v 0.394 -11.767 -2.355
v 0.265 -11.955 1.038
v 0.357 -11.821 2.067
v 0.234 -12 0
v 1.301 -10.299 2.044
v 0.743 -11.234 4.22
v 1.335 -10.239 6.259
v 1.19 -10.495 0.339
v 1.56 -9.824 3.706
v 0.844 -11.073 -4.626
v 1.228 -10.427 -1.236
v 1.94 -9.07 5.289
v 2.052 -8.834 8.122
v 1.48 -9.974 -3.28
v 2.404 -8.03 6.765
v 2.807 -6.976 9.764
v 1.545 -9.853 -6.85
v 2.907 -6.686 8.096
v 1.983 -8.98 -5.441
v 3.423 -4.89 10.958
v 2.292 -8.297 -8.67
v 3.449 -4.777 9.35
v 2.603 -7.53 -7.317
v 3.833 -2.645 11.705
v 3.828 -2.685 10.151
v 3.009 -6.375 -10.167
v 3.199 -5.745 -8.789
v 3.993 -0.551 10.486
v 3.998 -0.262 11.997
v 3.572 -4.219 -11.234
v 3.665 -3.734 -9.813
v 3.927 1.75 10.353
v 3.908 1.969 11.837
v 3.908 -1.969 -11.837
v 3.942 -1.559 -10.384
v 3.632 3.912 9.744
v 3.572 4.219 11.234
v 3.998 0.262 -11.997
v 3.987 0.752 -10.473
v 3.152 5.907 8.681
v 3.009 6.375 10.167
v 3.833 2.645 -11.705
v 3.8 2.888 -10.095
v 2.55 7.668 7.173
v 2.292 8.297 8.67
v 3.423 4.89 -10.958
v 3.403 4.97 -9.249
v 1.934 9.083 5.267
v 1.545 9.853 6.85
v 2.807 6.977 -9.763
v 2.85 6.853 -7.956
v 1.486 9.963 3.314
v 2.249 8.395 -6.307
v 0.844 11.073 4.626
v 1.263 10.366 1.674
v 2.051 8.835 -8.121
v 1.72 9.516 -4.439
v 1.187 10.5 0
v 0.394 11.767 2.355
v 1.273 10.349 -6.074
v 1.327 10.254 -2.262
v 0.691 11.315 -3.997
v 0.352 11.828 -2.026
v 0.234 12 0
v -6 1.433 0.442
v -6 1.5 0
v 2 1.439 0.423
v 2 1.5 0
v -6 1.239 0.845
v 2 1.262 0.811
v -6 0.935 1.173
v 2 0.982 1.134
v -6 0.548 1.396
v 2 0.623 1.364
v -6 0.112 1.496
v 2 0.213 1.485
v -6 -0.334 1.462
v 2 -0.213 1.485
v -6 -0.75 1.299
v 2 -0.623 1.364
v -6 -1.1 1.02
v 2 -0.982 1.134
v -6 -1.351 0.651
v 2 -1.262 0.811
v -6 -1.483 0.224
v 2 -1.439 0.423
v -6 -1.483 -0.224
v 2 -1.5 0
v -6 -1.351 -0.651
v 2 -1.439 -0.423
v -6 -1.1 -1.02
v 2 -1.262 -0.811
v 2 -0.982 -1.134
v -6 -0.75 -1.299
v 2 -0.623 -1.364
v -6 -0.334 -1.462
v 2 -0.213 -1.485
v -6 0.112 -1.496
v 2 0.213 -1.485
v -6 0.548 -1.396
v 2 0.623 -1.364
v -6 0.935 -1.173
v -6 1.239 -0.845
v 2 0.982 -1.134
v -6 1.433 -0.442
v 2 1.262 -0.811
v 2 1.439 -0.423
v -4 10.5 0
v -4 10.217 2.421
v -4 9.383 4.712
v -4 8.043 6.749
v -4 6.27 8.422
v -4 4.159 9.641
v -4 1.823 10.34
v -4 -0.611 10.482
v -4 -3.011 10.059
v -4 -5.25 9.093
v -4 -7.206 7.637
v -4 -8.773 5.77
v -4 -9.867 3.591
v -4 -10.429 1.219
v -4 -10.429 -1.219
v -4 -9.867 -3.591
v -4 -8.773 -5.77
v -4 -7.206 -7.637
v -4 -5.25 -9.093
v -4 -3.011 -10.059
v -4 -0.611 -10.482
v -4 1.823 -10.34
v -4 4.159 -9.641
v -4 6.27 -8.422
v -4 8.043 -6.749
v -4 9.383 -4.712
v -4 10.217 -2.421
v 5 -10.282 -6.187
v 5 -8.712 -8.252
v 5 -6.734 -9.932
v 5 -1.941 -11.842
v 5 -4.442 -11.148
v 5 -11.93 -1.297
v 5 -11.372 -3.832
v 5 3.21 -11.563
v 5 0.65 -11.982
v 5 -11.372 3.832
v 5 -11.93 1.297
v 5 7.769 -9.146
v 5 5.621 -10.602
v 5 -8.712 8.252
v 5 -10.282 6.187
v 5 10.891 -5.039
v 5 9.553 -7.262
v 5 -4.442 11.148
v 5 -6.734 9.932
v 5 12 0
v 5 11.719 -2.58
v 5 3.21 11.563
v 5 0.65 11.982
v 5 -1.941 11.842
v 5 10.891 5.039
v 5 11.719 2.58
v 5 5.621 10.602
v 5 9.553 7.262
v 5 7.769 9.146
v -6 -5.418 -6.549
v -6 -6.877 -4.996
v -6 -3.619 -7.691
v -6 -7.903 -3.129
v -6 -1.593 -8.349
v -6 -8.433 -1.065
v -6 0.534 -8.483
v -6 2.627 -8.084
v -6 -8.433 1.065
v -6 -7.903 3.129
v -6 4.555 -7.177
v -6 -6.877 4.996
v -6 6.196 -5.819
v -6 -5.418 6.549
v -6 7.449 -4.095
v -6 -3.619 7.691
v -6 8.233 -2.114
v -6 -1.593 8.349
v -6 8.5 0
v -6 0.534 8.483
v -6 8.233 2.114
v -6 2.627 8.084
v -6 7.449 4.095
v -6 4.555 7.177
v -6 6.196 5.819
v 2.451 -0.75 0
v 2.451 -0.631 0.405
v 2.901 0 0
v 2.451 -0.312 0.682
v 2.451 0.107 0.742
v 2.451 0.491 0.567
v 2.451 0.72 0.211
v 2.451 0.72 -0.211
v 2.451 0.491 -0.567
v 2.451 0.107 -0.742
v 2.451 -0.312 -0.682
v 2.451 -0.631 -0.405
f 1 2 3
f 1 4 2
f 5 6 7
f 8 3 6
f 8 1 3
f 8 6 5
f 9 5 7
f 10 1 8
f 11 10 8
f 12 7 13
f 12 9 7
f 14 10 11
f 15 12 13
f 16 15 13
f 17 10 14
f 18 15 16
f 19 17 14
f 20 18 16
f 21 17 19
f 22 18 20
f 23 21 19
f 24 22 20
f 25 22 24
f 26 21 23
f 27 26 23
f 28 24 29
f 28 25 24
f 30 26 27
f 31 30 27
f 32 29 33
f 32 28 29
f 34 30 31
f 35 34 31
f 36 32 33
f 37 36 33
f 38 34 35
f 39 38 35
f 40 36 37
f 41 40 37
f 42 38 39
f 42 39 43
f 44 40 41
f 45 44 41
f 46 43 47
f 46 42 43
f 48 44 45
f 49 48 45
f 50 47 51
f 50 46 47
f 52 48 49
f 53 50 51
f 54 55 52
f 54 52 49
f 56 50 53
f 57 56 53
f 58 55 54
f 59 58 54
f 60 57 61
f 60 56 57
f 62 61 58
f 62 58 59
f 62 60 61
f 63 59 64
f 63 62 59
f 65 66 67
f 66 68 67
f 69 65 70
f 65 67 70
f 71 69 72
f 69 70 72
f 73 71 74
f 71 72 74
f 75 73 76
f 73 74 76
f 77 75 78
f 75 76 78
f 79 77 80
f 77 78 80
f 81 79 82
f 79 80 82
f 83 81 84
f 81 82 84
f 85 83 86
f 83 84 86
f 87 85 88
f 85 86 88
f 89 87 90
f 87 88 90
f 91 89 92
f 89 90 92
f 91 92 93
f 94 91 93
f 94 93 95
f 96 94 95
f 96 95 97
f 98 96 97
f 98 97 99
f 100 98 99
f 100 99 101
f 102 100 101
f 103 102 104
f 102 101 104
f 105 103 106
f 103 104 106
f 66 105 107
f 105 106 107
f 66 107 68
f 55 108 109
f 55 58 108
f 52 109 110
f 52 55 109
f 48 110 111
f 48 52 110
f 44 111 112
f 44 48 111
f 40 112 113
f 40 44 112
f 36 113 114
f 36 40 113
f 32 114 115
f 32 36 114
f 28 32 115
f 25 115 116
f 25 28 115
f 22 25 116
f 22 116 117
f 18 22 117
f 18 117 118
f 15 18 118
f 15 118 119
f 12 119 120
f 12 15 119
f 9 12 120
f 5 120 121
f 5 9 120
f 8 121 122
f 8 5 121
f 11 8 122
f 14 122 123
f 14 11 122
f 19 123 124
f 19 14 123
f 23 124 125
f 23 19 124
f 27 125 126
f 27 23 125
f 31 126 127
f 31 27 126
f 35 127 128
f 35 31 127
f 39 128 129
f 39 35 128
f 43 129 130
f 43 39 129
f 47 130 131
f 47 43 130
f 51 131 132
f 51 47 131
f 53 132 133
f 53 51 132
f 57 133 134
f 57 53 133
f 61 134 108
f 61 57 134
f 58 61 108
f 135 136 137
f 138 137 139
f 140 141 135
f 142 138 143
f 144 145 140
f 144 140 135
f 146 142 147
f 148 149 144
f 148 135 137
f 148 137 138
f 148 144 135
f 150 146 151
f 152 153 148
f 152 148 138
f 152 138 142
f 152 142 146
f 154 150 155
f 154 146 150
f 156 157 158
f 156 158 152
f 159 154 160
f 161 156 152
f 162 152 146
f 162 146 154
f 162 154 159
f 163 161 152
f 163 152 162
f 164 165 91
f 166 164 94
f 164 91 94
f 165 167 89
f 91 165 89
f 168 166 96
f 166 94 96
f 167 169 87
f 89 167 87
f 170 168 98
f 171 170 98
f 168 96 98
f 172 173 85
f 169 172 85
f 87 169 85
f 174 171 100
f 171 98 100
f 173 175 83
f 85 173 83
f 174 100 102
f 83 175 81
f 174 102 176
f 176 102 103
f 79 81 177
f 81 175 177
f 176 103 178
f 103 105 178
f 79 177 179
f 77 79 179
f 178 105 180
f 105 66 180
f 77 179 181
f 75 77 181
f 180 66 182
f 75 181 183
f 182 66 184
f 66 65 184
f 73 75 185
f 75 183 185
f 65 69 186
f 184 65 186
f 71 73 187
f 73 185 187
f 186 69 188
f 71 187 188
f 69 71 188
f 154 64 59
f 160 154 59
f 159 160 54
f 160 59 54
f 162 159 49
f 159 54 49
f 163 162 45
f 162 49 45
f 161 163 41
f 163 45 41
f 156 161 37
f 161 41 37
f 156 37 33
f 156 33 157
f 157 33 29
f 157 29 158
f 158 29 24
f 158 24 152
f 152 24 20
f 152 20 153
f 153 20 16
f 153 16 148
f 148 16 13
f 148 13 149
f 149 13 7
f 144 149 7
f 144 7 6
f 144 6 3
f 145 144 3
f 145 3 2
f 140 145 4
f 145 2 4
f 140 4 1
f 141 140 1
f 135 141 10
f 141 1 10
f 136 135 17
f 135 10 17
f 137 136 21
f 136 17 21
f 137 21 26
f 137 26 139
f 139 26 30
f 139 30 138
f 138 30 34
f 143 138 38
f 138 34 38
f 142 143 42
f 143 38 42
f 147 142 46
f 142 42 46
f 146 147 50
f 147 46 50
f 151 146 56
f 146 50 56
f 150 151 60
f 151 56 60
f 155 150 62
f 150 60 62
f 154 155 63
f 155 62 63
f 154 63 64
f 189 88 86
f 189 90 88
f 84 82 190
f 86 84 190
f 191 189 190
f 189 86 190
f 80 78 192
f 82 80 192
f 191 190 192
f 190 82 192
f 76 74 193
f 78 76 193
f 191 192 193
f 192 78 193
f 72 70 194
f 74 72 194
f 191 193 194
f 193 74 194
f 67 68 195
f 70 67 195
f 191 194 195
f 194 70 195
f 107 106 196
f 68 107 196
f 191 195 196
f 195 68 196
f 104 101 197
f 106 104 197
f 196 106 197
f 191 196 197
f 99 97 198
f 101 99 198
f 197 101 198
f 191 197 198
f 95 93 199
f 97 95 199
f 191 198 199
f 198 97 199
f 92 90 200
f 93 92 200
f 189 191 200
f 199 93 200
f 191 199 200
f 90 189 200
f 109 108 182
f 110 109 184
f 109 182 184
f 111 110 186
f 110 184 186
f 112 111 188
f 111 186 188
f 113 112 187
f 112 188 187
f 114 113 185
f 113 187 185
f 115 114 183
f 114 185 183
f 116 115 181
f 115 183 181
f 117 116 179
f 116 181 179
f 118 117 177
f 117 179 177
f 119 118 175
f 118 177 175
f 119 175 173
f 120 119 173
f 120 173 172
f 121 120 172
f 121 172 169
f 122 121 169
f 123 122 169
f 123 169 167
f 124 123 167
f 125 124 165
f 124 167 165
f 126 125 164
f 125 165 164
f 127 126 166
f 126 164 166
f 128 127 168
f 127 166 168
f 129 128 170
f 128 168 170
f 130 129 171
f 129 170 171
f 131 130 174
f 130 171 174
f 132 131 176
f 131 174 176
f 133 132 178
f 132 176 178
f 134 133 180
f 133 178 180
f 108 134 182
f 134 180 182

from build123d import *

# Parameters (mm, degrees)
F0_R          = 12
F1_DEPTH      = 5
F2_R          = 21
F3_DEPTH      = 12.001
F3_DEPTH_BACK = 12.001
F4_R          = 10.5
F5_DEPTH      = 6
F5_DEPTH_BACK = 4
F6_SIZE       = 2
F8_D          = 3
F8_DEPTH      = 8
F8_TIP        = 0.9012909285


with BuildPart() as f1:
    # F0 (on Right) → F1 (new body)
    with BuildSketch(Plane.YZ):
        Circle(F0_R)
    extrude(amount=F1_DEPTH)

    # F2 (on Top) → F3 (cut, two sides)
    with BuildSketch(Plane.XY) as f3_sk:
        with Locations((-17, 0)):
            Circle(F2_R)
    extrude(amount=-F3_DEPTH, mode=Mode.SUBTRACT)
    extrude(f3_sk.sketch, amount=F3_DEPTH_BACK, mode=Mode.SUBTRACT)

    # F4 (on Right) → F5 (join, two sides)
    with BuildSketch(Plane.YZ) as f5_sk:
        Circle(F4_R)
    extrude(amount=-F5_DEPTH)
    extrude(f5_sk.sketch, amount=F5_DEPTH_BACK)

    # F6
    f6_edges = [f1.edges().sort_by_distance(p)[0] for p in [
        (-6, -10.5, 0),
    ]]
    chamfer(f6_edges, length=F6_SIZE)

    # F8
    with Locations(Plane(origin=(-6, 0, 0), x_dir=(0, -1, 0), z_dir=(-1, 0, 0))):
        with Locations((0, 0)):
            Hole(F8_D / 2, depth=F8_DEPTH)
            with Locations((0, 0, -(F8_DEPTH + F8_TIP / 2))):  # 118° drill point
                Cone(0, F8_D / 2, F8_TIP, mode=Mode.SUBTRACT)


solid = f1.part
